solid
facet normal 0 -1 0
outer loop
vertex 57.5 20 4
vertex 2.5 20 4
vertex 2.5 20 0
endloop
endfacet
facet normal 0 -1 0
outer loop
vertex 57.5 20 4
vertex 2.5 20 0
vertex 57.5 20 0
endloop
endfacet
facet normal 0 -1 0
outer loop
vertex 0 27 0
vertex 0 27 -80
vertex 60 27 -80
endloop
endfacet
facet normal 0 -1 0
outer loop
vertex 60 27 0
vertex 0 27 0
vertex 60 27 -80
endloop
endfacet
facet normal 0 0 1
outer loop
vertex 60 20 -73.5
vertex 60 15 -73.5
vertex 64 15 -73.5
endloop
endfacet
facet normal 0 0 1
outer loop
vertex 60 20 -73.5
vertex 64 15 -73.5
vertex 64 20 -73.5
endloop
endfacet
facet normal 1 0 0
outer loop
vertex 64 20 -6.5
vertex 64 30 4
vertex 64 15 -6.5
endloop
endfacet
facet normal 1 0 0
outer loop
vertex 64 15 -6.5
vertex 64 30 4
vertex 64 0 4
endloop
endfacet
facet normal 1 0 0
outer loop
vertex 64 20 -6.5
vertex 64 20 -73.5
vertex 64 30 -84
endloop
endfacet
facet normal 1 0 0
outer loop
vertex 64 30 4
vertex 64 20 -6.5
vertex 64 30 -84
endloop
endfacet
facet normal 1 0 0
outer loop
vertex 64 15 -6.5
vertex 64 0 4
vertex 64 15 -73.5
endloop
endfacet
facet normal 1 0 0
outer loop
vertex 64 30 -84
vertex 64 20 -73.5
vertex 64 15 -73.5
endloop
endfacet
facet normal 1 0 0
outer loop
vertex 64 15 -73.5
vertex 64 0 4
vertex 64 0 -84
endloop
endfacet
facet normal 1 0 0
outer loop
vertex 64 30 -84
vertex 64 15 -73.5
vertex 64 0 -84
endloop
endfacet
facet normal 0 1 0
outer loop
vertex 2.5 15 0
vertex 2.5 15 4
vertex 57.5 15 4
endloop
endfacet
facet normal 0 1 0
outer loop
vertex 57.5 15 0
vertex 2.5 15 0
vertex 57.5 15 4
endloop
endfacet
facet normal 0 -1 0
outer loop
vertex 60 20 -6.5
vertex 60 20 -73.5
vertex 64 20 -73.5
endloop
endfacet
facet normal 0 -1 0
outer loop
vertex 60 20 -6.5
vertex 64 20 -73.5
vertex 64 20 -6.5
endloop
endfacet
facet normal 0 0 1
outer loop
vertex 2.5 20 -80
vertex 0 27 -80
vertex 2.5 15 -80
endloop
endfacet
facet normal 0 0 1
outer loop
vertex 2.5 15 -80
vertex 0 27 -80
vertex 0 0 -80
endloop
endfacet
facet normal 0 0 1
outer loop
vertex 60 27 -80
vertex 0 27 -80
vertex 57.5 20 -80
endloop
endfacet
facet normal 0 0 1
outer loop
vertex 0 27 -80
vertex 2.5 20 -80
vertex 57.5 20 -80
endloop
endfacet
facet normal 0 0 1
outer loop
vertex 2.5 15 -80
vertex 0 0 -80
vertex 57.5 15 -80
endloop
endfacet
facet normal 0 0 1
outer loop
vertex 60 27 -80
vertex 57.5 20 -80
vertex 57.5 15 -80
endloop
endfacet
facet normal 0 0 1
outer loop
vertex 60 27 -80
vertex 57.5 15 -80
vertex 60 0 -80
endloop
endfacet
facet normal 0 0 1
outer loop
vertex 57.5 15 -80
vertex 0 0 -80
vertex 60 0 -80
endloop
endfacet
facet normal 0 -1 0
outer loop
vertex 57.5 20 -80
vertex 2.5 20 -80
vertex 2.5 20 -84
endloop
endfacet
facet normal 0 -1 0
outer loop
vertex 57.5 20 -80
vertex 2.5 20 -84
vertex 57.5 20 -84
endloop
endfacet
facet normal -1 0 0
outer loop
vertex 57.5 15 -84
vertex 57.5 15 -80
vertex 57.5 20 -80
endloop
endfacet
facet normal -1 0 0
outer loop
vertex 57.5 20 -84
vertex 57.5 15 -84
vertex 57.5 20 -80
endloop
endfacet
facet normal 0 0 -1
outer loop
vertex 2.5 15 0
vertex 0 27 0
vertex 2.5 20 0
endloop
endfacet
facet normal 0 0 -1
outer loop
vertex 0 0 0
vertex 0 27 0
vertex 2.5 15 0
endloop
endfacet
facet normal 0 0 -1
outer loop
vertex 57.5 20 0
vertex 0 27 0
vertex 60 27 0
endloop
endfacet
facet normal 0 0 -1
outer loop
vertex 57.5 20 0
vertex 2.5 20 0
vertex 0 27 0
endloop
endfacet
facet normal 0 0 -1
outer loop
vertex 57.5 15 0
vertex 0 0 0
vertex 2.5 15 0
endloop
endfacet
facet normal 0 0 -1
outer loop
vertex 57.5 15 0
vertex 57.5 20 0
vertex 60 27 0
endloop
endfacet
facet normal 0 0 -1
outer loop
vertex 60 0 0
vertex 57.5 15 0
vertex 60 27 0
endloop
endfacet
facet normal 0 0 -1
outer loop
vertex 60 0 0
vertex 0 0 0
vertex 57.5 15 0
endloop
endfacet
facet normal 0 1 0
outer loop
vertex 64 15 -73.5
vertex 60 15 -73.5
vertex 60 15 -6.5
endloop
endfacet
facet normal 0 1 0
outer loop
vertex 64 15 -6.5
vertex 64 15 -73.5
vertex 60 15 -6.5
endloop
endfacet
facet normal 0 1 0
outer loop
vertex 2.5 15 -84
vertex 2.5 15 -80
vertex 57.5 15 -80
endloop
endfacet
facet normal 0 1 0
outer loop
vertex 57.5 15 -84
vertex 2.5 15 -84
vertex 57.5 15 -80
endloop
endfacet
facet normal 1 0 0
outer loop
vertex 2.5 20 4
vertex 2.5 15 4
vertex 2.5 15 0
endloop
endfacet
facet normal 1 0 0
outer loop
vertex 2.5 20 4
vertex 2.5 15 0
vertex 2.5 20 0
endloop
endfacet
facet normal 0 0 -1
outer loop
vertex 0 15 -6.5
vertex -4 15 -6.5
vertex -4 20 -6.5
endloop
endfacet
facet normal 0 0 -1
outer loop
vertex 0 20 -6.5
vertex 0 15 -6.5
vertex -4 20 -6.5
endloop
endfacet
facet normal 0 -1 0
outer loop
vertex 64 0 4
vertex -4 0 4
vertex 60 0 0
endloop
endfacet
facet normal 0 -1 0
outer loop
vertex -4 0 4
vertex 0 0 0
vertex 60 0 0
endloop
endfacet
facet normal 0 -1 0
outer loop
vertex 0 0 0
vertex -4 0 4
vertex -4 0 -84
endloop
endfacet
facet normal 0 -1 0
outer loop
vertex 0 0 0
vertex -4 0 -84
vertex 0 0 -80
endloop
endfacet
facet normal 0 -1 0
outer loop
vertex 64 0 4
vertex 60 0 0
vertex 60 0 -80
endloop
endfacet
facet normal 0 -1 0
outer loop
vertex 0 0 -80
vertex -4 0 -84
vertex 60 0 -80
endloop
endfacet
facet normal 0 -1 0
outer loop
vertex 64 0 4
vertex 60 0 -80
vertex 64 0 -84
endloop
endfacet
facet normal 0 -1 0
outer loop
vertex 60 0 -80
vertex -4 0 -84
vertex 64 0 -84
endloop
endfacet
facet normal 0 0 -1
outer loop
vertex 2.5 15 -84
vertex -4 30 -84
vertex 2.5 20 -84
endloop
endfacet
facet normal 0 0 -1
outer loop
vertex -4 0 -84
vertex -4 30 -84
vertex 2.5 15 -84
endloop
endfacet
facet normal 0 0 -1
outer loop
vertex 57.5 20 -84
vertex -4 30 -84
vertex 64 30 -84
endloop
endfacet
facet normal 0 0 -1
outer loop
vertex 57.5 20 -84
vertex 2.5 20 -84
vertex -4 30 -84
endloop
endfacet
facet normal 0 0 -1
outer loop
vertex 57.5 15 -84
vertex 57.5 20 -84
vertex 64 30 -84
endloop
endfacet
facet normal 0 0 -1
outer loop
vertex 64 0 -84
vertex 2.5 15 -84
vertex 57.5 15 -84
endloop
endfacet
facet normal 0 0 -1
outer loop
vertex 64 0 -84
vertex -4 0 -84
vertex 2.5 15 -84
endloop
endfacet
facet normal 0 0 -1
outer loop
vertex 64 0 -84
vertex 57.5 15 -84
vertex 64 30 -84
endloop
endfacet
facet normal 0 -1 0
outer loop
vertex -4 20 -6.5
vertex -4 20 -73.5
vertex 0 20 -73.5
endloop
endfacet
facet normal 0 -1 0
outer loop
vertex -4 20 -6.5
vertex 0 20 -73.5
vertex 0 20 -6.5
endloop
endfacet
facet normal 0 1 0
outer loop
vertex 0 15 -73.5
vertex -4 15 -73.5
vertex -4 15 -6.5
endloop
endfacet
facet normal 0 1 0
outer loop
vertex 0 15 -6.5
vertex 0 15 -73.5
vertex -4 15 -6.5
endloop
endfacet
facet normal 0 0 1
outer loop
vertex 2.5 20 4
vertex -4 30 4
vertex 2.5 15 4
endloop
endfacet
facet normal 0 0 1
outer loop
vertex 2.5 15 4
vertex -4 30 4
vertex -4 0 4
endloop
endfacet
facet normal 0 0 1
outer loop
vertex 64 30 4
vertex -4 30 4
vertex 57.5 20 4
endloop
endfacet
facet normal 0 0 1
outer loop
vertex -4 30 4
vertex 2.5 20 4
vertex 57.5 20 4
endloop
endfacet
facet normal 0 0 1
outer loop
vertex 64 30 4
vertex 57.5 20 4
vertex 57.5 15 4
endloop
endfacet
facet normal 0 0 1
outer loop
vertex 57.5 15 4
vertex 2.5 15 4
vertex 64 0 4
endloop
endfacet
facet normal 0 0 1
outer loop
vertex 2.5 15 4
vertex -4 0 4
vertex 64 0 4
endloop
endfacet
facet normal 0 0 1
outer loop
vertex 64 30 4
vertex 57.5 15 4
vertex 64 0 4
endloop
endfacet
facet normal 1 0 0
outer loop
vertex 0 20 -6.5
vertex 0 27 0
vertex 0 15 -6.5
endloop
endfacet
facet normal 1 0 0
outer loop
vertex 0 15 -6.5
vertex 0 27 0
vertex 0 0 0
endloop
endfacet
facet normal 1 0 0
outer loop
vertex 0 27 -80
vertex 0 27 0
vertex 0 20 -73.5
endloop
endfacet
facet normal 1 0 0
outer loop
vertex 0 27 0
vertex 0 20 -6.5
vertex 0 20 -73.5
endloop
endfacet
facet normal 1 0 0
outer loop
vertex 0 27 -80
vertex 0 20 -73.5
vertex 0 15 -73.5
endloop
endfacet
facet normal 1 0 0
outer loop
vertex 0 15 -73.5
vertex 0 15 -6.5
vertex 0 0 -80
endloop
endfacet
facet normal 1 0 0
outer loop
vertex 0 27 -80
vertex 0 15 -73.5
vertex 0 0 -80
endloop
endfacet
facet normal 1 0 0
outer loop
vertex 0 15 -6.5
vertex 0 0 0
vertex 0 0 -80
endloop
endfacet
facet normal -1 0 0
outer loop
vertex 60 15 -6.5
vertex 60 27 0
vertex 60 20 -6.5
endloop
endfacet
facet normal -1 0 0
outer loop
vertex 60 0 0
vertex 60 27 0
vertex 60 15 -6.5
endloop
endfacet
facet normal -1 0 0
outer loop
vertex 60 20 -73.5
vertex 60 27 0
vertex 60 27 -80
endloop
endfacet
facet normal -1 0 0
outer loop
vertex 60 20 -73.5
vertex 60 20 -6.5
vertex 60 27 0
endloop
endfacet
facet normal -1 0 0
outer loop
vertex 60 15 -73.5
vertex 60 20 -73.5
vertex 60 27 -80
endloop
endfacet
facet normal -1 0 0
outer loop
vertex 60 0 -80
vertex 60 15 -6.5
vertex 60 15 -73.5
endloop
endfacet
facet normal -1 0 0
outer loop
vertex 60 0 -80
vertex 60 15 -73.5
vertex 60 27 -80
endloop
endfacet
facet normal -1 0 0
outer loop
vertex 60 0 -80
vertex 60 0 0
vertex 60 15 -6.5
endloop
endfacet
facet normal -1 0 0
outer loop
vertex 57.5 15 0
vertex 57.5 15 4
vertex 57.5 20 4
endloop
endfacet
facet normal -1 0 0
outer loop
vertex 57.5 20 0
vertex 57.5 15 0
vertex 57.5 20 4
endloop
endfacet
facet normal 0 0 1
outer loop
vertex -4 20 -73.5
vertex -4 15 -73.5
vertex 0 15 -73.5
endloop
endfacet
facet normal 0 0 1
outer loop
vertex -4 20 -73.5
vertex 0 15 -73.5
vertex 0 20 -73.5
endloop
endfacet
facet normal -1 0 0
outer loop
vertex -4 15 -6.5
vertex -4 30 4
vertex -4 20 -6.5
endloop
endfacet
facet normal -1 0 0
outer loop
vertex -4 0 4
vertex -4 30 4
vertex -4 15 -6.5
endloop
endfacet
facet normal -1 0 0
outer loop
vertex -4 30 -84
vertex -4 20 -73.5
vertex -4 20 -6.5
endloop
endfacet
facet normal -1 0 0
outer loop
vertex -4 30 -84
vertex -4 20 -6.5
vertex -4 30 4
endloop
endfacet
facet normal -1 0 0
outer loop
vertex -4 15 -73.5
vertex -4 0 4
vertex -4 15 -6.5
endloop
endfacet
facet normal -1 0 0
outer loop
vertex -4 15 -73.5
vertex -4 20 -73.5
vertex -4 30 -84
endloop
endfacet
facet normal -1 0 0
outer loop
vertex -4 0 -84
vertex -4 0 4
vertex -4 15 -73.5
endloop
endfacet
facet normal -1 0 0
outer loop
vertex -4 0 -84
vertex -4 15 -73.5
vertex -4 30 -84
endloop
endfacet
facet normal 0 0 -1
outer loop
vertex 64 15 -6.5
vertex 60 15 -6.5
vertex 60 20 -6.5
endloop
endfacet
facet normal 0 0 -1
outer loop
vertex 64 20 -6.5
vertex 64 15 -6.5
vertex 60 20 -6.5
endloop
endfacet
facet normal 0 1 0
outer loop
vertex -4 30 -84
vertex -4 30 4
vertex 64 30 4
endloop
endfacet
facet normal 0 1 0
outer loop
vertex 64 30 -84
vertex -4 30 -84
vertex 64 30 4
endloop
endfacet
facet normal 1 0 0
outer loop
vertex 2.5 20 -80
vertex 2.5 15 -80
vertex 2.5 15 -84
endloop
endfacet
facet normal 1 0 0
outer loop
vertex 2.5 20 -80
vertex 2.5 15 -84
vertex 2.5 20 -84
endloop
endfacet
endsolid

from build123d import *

# Parameters (mm, degrees)
CROQUIS1_W              = 68
CROQUIS1_H              = 88
CROQUIS1_W_2            = 60
CROQUIS1_H_2            = 80
SALIENTE_EXTRUIR1_DEPTH = 27
CROQUIS3_W              = 68
CROQUIS3_H              = 88
SALIENTE_EXTRUIR2_DEPTH = 3
CROQUIS4_W              = 67
CROQUIS4_H              = 5
CORTAR_EXTRUIR1_DEPTH   = 69
CROQUIS5_W              = 55
CROQUIS5_H              = 5
CORTAR_EXTRUIR2_DEPTH   = 89


with BuildPart() as part:
    # Croquis1 → Saliente-Extruir1 (new body)
    with BuildSketch(Plane(origin=(0, 0, 0), x_dir=(1, 0, 0), z_dir=(0, 1, 0))):
        with Locations((30, 40)):
            Rectangle(CROQUIS1_W, CROQUIS1_H)
        with Locations((30, 40)):
            Rectangle(CROQUIS1_W_2, CROQUIS1_H_2, mode=Mode.SUBTRACT)
    extrude(amount=SALIENTE_EXTRUIR1_DEPTH)

    # Croquis3 → Saliente-Extruir2 (add)
    with BuildSketch(Plane(origin=(0, 27, 0), x_dir=(1, 0, 0), z_dir=(0, 1, 0))):
        with Locations((30, 40)):
            Rectangle(CROQUIS3_W, CROQUIS3_H)
    extrude(amount=SALIENTE_EXTRUIR2_DEPTH)

    # Croquis4 → Cortar-Extruir1 (cut, through all)
    with BuildSketch(Plane.ZY.offset(4)):
        with Locations((-40, 17.5)):
            Rectangle(CROQUIS4_W, CROQUIS4_H)
    extrude(amount=-CORTAR_EXTRUIR1_DEPTH, mode=Mode.SUBTRACT)

    # Croquis5 → Cortar-Extruir2 (cut, through all)
    with BuildSketch(Plane.XY.offset(4)):
        with Locations((30, 17.5)):
            Rectangle(CROQUIS5_W, CROQUIS5_H)
    extrude(amount=-CORTAR_EXTRUIR2_DEPTH, mode=Mode.SUBTRACT)


solid = part.part
